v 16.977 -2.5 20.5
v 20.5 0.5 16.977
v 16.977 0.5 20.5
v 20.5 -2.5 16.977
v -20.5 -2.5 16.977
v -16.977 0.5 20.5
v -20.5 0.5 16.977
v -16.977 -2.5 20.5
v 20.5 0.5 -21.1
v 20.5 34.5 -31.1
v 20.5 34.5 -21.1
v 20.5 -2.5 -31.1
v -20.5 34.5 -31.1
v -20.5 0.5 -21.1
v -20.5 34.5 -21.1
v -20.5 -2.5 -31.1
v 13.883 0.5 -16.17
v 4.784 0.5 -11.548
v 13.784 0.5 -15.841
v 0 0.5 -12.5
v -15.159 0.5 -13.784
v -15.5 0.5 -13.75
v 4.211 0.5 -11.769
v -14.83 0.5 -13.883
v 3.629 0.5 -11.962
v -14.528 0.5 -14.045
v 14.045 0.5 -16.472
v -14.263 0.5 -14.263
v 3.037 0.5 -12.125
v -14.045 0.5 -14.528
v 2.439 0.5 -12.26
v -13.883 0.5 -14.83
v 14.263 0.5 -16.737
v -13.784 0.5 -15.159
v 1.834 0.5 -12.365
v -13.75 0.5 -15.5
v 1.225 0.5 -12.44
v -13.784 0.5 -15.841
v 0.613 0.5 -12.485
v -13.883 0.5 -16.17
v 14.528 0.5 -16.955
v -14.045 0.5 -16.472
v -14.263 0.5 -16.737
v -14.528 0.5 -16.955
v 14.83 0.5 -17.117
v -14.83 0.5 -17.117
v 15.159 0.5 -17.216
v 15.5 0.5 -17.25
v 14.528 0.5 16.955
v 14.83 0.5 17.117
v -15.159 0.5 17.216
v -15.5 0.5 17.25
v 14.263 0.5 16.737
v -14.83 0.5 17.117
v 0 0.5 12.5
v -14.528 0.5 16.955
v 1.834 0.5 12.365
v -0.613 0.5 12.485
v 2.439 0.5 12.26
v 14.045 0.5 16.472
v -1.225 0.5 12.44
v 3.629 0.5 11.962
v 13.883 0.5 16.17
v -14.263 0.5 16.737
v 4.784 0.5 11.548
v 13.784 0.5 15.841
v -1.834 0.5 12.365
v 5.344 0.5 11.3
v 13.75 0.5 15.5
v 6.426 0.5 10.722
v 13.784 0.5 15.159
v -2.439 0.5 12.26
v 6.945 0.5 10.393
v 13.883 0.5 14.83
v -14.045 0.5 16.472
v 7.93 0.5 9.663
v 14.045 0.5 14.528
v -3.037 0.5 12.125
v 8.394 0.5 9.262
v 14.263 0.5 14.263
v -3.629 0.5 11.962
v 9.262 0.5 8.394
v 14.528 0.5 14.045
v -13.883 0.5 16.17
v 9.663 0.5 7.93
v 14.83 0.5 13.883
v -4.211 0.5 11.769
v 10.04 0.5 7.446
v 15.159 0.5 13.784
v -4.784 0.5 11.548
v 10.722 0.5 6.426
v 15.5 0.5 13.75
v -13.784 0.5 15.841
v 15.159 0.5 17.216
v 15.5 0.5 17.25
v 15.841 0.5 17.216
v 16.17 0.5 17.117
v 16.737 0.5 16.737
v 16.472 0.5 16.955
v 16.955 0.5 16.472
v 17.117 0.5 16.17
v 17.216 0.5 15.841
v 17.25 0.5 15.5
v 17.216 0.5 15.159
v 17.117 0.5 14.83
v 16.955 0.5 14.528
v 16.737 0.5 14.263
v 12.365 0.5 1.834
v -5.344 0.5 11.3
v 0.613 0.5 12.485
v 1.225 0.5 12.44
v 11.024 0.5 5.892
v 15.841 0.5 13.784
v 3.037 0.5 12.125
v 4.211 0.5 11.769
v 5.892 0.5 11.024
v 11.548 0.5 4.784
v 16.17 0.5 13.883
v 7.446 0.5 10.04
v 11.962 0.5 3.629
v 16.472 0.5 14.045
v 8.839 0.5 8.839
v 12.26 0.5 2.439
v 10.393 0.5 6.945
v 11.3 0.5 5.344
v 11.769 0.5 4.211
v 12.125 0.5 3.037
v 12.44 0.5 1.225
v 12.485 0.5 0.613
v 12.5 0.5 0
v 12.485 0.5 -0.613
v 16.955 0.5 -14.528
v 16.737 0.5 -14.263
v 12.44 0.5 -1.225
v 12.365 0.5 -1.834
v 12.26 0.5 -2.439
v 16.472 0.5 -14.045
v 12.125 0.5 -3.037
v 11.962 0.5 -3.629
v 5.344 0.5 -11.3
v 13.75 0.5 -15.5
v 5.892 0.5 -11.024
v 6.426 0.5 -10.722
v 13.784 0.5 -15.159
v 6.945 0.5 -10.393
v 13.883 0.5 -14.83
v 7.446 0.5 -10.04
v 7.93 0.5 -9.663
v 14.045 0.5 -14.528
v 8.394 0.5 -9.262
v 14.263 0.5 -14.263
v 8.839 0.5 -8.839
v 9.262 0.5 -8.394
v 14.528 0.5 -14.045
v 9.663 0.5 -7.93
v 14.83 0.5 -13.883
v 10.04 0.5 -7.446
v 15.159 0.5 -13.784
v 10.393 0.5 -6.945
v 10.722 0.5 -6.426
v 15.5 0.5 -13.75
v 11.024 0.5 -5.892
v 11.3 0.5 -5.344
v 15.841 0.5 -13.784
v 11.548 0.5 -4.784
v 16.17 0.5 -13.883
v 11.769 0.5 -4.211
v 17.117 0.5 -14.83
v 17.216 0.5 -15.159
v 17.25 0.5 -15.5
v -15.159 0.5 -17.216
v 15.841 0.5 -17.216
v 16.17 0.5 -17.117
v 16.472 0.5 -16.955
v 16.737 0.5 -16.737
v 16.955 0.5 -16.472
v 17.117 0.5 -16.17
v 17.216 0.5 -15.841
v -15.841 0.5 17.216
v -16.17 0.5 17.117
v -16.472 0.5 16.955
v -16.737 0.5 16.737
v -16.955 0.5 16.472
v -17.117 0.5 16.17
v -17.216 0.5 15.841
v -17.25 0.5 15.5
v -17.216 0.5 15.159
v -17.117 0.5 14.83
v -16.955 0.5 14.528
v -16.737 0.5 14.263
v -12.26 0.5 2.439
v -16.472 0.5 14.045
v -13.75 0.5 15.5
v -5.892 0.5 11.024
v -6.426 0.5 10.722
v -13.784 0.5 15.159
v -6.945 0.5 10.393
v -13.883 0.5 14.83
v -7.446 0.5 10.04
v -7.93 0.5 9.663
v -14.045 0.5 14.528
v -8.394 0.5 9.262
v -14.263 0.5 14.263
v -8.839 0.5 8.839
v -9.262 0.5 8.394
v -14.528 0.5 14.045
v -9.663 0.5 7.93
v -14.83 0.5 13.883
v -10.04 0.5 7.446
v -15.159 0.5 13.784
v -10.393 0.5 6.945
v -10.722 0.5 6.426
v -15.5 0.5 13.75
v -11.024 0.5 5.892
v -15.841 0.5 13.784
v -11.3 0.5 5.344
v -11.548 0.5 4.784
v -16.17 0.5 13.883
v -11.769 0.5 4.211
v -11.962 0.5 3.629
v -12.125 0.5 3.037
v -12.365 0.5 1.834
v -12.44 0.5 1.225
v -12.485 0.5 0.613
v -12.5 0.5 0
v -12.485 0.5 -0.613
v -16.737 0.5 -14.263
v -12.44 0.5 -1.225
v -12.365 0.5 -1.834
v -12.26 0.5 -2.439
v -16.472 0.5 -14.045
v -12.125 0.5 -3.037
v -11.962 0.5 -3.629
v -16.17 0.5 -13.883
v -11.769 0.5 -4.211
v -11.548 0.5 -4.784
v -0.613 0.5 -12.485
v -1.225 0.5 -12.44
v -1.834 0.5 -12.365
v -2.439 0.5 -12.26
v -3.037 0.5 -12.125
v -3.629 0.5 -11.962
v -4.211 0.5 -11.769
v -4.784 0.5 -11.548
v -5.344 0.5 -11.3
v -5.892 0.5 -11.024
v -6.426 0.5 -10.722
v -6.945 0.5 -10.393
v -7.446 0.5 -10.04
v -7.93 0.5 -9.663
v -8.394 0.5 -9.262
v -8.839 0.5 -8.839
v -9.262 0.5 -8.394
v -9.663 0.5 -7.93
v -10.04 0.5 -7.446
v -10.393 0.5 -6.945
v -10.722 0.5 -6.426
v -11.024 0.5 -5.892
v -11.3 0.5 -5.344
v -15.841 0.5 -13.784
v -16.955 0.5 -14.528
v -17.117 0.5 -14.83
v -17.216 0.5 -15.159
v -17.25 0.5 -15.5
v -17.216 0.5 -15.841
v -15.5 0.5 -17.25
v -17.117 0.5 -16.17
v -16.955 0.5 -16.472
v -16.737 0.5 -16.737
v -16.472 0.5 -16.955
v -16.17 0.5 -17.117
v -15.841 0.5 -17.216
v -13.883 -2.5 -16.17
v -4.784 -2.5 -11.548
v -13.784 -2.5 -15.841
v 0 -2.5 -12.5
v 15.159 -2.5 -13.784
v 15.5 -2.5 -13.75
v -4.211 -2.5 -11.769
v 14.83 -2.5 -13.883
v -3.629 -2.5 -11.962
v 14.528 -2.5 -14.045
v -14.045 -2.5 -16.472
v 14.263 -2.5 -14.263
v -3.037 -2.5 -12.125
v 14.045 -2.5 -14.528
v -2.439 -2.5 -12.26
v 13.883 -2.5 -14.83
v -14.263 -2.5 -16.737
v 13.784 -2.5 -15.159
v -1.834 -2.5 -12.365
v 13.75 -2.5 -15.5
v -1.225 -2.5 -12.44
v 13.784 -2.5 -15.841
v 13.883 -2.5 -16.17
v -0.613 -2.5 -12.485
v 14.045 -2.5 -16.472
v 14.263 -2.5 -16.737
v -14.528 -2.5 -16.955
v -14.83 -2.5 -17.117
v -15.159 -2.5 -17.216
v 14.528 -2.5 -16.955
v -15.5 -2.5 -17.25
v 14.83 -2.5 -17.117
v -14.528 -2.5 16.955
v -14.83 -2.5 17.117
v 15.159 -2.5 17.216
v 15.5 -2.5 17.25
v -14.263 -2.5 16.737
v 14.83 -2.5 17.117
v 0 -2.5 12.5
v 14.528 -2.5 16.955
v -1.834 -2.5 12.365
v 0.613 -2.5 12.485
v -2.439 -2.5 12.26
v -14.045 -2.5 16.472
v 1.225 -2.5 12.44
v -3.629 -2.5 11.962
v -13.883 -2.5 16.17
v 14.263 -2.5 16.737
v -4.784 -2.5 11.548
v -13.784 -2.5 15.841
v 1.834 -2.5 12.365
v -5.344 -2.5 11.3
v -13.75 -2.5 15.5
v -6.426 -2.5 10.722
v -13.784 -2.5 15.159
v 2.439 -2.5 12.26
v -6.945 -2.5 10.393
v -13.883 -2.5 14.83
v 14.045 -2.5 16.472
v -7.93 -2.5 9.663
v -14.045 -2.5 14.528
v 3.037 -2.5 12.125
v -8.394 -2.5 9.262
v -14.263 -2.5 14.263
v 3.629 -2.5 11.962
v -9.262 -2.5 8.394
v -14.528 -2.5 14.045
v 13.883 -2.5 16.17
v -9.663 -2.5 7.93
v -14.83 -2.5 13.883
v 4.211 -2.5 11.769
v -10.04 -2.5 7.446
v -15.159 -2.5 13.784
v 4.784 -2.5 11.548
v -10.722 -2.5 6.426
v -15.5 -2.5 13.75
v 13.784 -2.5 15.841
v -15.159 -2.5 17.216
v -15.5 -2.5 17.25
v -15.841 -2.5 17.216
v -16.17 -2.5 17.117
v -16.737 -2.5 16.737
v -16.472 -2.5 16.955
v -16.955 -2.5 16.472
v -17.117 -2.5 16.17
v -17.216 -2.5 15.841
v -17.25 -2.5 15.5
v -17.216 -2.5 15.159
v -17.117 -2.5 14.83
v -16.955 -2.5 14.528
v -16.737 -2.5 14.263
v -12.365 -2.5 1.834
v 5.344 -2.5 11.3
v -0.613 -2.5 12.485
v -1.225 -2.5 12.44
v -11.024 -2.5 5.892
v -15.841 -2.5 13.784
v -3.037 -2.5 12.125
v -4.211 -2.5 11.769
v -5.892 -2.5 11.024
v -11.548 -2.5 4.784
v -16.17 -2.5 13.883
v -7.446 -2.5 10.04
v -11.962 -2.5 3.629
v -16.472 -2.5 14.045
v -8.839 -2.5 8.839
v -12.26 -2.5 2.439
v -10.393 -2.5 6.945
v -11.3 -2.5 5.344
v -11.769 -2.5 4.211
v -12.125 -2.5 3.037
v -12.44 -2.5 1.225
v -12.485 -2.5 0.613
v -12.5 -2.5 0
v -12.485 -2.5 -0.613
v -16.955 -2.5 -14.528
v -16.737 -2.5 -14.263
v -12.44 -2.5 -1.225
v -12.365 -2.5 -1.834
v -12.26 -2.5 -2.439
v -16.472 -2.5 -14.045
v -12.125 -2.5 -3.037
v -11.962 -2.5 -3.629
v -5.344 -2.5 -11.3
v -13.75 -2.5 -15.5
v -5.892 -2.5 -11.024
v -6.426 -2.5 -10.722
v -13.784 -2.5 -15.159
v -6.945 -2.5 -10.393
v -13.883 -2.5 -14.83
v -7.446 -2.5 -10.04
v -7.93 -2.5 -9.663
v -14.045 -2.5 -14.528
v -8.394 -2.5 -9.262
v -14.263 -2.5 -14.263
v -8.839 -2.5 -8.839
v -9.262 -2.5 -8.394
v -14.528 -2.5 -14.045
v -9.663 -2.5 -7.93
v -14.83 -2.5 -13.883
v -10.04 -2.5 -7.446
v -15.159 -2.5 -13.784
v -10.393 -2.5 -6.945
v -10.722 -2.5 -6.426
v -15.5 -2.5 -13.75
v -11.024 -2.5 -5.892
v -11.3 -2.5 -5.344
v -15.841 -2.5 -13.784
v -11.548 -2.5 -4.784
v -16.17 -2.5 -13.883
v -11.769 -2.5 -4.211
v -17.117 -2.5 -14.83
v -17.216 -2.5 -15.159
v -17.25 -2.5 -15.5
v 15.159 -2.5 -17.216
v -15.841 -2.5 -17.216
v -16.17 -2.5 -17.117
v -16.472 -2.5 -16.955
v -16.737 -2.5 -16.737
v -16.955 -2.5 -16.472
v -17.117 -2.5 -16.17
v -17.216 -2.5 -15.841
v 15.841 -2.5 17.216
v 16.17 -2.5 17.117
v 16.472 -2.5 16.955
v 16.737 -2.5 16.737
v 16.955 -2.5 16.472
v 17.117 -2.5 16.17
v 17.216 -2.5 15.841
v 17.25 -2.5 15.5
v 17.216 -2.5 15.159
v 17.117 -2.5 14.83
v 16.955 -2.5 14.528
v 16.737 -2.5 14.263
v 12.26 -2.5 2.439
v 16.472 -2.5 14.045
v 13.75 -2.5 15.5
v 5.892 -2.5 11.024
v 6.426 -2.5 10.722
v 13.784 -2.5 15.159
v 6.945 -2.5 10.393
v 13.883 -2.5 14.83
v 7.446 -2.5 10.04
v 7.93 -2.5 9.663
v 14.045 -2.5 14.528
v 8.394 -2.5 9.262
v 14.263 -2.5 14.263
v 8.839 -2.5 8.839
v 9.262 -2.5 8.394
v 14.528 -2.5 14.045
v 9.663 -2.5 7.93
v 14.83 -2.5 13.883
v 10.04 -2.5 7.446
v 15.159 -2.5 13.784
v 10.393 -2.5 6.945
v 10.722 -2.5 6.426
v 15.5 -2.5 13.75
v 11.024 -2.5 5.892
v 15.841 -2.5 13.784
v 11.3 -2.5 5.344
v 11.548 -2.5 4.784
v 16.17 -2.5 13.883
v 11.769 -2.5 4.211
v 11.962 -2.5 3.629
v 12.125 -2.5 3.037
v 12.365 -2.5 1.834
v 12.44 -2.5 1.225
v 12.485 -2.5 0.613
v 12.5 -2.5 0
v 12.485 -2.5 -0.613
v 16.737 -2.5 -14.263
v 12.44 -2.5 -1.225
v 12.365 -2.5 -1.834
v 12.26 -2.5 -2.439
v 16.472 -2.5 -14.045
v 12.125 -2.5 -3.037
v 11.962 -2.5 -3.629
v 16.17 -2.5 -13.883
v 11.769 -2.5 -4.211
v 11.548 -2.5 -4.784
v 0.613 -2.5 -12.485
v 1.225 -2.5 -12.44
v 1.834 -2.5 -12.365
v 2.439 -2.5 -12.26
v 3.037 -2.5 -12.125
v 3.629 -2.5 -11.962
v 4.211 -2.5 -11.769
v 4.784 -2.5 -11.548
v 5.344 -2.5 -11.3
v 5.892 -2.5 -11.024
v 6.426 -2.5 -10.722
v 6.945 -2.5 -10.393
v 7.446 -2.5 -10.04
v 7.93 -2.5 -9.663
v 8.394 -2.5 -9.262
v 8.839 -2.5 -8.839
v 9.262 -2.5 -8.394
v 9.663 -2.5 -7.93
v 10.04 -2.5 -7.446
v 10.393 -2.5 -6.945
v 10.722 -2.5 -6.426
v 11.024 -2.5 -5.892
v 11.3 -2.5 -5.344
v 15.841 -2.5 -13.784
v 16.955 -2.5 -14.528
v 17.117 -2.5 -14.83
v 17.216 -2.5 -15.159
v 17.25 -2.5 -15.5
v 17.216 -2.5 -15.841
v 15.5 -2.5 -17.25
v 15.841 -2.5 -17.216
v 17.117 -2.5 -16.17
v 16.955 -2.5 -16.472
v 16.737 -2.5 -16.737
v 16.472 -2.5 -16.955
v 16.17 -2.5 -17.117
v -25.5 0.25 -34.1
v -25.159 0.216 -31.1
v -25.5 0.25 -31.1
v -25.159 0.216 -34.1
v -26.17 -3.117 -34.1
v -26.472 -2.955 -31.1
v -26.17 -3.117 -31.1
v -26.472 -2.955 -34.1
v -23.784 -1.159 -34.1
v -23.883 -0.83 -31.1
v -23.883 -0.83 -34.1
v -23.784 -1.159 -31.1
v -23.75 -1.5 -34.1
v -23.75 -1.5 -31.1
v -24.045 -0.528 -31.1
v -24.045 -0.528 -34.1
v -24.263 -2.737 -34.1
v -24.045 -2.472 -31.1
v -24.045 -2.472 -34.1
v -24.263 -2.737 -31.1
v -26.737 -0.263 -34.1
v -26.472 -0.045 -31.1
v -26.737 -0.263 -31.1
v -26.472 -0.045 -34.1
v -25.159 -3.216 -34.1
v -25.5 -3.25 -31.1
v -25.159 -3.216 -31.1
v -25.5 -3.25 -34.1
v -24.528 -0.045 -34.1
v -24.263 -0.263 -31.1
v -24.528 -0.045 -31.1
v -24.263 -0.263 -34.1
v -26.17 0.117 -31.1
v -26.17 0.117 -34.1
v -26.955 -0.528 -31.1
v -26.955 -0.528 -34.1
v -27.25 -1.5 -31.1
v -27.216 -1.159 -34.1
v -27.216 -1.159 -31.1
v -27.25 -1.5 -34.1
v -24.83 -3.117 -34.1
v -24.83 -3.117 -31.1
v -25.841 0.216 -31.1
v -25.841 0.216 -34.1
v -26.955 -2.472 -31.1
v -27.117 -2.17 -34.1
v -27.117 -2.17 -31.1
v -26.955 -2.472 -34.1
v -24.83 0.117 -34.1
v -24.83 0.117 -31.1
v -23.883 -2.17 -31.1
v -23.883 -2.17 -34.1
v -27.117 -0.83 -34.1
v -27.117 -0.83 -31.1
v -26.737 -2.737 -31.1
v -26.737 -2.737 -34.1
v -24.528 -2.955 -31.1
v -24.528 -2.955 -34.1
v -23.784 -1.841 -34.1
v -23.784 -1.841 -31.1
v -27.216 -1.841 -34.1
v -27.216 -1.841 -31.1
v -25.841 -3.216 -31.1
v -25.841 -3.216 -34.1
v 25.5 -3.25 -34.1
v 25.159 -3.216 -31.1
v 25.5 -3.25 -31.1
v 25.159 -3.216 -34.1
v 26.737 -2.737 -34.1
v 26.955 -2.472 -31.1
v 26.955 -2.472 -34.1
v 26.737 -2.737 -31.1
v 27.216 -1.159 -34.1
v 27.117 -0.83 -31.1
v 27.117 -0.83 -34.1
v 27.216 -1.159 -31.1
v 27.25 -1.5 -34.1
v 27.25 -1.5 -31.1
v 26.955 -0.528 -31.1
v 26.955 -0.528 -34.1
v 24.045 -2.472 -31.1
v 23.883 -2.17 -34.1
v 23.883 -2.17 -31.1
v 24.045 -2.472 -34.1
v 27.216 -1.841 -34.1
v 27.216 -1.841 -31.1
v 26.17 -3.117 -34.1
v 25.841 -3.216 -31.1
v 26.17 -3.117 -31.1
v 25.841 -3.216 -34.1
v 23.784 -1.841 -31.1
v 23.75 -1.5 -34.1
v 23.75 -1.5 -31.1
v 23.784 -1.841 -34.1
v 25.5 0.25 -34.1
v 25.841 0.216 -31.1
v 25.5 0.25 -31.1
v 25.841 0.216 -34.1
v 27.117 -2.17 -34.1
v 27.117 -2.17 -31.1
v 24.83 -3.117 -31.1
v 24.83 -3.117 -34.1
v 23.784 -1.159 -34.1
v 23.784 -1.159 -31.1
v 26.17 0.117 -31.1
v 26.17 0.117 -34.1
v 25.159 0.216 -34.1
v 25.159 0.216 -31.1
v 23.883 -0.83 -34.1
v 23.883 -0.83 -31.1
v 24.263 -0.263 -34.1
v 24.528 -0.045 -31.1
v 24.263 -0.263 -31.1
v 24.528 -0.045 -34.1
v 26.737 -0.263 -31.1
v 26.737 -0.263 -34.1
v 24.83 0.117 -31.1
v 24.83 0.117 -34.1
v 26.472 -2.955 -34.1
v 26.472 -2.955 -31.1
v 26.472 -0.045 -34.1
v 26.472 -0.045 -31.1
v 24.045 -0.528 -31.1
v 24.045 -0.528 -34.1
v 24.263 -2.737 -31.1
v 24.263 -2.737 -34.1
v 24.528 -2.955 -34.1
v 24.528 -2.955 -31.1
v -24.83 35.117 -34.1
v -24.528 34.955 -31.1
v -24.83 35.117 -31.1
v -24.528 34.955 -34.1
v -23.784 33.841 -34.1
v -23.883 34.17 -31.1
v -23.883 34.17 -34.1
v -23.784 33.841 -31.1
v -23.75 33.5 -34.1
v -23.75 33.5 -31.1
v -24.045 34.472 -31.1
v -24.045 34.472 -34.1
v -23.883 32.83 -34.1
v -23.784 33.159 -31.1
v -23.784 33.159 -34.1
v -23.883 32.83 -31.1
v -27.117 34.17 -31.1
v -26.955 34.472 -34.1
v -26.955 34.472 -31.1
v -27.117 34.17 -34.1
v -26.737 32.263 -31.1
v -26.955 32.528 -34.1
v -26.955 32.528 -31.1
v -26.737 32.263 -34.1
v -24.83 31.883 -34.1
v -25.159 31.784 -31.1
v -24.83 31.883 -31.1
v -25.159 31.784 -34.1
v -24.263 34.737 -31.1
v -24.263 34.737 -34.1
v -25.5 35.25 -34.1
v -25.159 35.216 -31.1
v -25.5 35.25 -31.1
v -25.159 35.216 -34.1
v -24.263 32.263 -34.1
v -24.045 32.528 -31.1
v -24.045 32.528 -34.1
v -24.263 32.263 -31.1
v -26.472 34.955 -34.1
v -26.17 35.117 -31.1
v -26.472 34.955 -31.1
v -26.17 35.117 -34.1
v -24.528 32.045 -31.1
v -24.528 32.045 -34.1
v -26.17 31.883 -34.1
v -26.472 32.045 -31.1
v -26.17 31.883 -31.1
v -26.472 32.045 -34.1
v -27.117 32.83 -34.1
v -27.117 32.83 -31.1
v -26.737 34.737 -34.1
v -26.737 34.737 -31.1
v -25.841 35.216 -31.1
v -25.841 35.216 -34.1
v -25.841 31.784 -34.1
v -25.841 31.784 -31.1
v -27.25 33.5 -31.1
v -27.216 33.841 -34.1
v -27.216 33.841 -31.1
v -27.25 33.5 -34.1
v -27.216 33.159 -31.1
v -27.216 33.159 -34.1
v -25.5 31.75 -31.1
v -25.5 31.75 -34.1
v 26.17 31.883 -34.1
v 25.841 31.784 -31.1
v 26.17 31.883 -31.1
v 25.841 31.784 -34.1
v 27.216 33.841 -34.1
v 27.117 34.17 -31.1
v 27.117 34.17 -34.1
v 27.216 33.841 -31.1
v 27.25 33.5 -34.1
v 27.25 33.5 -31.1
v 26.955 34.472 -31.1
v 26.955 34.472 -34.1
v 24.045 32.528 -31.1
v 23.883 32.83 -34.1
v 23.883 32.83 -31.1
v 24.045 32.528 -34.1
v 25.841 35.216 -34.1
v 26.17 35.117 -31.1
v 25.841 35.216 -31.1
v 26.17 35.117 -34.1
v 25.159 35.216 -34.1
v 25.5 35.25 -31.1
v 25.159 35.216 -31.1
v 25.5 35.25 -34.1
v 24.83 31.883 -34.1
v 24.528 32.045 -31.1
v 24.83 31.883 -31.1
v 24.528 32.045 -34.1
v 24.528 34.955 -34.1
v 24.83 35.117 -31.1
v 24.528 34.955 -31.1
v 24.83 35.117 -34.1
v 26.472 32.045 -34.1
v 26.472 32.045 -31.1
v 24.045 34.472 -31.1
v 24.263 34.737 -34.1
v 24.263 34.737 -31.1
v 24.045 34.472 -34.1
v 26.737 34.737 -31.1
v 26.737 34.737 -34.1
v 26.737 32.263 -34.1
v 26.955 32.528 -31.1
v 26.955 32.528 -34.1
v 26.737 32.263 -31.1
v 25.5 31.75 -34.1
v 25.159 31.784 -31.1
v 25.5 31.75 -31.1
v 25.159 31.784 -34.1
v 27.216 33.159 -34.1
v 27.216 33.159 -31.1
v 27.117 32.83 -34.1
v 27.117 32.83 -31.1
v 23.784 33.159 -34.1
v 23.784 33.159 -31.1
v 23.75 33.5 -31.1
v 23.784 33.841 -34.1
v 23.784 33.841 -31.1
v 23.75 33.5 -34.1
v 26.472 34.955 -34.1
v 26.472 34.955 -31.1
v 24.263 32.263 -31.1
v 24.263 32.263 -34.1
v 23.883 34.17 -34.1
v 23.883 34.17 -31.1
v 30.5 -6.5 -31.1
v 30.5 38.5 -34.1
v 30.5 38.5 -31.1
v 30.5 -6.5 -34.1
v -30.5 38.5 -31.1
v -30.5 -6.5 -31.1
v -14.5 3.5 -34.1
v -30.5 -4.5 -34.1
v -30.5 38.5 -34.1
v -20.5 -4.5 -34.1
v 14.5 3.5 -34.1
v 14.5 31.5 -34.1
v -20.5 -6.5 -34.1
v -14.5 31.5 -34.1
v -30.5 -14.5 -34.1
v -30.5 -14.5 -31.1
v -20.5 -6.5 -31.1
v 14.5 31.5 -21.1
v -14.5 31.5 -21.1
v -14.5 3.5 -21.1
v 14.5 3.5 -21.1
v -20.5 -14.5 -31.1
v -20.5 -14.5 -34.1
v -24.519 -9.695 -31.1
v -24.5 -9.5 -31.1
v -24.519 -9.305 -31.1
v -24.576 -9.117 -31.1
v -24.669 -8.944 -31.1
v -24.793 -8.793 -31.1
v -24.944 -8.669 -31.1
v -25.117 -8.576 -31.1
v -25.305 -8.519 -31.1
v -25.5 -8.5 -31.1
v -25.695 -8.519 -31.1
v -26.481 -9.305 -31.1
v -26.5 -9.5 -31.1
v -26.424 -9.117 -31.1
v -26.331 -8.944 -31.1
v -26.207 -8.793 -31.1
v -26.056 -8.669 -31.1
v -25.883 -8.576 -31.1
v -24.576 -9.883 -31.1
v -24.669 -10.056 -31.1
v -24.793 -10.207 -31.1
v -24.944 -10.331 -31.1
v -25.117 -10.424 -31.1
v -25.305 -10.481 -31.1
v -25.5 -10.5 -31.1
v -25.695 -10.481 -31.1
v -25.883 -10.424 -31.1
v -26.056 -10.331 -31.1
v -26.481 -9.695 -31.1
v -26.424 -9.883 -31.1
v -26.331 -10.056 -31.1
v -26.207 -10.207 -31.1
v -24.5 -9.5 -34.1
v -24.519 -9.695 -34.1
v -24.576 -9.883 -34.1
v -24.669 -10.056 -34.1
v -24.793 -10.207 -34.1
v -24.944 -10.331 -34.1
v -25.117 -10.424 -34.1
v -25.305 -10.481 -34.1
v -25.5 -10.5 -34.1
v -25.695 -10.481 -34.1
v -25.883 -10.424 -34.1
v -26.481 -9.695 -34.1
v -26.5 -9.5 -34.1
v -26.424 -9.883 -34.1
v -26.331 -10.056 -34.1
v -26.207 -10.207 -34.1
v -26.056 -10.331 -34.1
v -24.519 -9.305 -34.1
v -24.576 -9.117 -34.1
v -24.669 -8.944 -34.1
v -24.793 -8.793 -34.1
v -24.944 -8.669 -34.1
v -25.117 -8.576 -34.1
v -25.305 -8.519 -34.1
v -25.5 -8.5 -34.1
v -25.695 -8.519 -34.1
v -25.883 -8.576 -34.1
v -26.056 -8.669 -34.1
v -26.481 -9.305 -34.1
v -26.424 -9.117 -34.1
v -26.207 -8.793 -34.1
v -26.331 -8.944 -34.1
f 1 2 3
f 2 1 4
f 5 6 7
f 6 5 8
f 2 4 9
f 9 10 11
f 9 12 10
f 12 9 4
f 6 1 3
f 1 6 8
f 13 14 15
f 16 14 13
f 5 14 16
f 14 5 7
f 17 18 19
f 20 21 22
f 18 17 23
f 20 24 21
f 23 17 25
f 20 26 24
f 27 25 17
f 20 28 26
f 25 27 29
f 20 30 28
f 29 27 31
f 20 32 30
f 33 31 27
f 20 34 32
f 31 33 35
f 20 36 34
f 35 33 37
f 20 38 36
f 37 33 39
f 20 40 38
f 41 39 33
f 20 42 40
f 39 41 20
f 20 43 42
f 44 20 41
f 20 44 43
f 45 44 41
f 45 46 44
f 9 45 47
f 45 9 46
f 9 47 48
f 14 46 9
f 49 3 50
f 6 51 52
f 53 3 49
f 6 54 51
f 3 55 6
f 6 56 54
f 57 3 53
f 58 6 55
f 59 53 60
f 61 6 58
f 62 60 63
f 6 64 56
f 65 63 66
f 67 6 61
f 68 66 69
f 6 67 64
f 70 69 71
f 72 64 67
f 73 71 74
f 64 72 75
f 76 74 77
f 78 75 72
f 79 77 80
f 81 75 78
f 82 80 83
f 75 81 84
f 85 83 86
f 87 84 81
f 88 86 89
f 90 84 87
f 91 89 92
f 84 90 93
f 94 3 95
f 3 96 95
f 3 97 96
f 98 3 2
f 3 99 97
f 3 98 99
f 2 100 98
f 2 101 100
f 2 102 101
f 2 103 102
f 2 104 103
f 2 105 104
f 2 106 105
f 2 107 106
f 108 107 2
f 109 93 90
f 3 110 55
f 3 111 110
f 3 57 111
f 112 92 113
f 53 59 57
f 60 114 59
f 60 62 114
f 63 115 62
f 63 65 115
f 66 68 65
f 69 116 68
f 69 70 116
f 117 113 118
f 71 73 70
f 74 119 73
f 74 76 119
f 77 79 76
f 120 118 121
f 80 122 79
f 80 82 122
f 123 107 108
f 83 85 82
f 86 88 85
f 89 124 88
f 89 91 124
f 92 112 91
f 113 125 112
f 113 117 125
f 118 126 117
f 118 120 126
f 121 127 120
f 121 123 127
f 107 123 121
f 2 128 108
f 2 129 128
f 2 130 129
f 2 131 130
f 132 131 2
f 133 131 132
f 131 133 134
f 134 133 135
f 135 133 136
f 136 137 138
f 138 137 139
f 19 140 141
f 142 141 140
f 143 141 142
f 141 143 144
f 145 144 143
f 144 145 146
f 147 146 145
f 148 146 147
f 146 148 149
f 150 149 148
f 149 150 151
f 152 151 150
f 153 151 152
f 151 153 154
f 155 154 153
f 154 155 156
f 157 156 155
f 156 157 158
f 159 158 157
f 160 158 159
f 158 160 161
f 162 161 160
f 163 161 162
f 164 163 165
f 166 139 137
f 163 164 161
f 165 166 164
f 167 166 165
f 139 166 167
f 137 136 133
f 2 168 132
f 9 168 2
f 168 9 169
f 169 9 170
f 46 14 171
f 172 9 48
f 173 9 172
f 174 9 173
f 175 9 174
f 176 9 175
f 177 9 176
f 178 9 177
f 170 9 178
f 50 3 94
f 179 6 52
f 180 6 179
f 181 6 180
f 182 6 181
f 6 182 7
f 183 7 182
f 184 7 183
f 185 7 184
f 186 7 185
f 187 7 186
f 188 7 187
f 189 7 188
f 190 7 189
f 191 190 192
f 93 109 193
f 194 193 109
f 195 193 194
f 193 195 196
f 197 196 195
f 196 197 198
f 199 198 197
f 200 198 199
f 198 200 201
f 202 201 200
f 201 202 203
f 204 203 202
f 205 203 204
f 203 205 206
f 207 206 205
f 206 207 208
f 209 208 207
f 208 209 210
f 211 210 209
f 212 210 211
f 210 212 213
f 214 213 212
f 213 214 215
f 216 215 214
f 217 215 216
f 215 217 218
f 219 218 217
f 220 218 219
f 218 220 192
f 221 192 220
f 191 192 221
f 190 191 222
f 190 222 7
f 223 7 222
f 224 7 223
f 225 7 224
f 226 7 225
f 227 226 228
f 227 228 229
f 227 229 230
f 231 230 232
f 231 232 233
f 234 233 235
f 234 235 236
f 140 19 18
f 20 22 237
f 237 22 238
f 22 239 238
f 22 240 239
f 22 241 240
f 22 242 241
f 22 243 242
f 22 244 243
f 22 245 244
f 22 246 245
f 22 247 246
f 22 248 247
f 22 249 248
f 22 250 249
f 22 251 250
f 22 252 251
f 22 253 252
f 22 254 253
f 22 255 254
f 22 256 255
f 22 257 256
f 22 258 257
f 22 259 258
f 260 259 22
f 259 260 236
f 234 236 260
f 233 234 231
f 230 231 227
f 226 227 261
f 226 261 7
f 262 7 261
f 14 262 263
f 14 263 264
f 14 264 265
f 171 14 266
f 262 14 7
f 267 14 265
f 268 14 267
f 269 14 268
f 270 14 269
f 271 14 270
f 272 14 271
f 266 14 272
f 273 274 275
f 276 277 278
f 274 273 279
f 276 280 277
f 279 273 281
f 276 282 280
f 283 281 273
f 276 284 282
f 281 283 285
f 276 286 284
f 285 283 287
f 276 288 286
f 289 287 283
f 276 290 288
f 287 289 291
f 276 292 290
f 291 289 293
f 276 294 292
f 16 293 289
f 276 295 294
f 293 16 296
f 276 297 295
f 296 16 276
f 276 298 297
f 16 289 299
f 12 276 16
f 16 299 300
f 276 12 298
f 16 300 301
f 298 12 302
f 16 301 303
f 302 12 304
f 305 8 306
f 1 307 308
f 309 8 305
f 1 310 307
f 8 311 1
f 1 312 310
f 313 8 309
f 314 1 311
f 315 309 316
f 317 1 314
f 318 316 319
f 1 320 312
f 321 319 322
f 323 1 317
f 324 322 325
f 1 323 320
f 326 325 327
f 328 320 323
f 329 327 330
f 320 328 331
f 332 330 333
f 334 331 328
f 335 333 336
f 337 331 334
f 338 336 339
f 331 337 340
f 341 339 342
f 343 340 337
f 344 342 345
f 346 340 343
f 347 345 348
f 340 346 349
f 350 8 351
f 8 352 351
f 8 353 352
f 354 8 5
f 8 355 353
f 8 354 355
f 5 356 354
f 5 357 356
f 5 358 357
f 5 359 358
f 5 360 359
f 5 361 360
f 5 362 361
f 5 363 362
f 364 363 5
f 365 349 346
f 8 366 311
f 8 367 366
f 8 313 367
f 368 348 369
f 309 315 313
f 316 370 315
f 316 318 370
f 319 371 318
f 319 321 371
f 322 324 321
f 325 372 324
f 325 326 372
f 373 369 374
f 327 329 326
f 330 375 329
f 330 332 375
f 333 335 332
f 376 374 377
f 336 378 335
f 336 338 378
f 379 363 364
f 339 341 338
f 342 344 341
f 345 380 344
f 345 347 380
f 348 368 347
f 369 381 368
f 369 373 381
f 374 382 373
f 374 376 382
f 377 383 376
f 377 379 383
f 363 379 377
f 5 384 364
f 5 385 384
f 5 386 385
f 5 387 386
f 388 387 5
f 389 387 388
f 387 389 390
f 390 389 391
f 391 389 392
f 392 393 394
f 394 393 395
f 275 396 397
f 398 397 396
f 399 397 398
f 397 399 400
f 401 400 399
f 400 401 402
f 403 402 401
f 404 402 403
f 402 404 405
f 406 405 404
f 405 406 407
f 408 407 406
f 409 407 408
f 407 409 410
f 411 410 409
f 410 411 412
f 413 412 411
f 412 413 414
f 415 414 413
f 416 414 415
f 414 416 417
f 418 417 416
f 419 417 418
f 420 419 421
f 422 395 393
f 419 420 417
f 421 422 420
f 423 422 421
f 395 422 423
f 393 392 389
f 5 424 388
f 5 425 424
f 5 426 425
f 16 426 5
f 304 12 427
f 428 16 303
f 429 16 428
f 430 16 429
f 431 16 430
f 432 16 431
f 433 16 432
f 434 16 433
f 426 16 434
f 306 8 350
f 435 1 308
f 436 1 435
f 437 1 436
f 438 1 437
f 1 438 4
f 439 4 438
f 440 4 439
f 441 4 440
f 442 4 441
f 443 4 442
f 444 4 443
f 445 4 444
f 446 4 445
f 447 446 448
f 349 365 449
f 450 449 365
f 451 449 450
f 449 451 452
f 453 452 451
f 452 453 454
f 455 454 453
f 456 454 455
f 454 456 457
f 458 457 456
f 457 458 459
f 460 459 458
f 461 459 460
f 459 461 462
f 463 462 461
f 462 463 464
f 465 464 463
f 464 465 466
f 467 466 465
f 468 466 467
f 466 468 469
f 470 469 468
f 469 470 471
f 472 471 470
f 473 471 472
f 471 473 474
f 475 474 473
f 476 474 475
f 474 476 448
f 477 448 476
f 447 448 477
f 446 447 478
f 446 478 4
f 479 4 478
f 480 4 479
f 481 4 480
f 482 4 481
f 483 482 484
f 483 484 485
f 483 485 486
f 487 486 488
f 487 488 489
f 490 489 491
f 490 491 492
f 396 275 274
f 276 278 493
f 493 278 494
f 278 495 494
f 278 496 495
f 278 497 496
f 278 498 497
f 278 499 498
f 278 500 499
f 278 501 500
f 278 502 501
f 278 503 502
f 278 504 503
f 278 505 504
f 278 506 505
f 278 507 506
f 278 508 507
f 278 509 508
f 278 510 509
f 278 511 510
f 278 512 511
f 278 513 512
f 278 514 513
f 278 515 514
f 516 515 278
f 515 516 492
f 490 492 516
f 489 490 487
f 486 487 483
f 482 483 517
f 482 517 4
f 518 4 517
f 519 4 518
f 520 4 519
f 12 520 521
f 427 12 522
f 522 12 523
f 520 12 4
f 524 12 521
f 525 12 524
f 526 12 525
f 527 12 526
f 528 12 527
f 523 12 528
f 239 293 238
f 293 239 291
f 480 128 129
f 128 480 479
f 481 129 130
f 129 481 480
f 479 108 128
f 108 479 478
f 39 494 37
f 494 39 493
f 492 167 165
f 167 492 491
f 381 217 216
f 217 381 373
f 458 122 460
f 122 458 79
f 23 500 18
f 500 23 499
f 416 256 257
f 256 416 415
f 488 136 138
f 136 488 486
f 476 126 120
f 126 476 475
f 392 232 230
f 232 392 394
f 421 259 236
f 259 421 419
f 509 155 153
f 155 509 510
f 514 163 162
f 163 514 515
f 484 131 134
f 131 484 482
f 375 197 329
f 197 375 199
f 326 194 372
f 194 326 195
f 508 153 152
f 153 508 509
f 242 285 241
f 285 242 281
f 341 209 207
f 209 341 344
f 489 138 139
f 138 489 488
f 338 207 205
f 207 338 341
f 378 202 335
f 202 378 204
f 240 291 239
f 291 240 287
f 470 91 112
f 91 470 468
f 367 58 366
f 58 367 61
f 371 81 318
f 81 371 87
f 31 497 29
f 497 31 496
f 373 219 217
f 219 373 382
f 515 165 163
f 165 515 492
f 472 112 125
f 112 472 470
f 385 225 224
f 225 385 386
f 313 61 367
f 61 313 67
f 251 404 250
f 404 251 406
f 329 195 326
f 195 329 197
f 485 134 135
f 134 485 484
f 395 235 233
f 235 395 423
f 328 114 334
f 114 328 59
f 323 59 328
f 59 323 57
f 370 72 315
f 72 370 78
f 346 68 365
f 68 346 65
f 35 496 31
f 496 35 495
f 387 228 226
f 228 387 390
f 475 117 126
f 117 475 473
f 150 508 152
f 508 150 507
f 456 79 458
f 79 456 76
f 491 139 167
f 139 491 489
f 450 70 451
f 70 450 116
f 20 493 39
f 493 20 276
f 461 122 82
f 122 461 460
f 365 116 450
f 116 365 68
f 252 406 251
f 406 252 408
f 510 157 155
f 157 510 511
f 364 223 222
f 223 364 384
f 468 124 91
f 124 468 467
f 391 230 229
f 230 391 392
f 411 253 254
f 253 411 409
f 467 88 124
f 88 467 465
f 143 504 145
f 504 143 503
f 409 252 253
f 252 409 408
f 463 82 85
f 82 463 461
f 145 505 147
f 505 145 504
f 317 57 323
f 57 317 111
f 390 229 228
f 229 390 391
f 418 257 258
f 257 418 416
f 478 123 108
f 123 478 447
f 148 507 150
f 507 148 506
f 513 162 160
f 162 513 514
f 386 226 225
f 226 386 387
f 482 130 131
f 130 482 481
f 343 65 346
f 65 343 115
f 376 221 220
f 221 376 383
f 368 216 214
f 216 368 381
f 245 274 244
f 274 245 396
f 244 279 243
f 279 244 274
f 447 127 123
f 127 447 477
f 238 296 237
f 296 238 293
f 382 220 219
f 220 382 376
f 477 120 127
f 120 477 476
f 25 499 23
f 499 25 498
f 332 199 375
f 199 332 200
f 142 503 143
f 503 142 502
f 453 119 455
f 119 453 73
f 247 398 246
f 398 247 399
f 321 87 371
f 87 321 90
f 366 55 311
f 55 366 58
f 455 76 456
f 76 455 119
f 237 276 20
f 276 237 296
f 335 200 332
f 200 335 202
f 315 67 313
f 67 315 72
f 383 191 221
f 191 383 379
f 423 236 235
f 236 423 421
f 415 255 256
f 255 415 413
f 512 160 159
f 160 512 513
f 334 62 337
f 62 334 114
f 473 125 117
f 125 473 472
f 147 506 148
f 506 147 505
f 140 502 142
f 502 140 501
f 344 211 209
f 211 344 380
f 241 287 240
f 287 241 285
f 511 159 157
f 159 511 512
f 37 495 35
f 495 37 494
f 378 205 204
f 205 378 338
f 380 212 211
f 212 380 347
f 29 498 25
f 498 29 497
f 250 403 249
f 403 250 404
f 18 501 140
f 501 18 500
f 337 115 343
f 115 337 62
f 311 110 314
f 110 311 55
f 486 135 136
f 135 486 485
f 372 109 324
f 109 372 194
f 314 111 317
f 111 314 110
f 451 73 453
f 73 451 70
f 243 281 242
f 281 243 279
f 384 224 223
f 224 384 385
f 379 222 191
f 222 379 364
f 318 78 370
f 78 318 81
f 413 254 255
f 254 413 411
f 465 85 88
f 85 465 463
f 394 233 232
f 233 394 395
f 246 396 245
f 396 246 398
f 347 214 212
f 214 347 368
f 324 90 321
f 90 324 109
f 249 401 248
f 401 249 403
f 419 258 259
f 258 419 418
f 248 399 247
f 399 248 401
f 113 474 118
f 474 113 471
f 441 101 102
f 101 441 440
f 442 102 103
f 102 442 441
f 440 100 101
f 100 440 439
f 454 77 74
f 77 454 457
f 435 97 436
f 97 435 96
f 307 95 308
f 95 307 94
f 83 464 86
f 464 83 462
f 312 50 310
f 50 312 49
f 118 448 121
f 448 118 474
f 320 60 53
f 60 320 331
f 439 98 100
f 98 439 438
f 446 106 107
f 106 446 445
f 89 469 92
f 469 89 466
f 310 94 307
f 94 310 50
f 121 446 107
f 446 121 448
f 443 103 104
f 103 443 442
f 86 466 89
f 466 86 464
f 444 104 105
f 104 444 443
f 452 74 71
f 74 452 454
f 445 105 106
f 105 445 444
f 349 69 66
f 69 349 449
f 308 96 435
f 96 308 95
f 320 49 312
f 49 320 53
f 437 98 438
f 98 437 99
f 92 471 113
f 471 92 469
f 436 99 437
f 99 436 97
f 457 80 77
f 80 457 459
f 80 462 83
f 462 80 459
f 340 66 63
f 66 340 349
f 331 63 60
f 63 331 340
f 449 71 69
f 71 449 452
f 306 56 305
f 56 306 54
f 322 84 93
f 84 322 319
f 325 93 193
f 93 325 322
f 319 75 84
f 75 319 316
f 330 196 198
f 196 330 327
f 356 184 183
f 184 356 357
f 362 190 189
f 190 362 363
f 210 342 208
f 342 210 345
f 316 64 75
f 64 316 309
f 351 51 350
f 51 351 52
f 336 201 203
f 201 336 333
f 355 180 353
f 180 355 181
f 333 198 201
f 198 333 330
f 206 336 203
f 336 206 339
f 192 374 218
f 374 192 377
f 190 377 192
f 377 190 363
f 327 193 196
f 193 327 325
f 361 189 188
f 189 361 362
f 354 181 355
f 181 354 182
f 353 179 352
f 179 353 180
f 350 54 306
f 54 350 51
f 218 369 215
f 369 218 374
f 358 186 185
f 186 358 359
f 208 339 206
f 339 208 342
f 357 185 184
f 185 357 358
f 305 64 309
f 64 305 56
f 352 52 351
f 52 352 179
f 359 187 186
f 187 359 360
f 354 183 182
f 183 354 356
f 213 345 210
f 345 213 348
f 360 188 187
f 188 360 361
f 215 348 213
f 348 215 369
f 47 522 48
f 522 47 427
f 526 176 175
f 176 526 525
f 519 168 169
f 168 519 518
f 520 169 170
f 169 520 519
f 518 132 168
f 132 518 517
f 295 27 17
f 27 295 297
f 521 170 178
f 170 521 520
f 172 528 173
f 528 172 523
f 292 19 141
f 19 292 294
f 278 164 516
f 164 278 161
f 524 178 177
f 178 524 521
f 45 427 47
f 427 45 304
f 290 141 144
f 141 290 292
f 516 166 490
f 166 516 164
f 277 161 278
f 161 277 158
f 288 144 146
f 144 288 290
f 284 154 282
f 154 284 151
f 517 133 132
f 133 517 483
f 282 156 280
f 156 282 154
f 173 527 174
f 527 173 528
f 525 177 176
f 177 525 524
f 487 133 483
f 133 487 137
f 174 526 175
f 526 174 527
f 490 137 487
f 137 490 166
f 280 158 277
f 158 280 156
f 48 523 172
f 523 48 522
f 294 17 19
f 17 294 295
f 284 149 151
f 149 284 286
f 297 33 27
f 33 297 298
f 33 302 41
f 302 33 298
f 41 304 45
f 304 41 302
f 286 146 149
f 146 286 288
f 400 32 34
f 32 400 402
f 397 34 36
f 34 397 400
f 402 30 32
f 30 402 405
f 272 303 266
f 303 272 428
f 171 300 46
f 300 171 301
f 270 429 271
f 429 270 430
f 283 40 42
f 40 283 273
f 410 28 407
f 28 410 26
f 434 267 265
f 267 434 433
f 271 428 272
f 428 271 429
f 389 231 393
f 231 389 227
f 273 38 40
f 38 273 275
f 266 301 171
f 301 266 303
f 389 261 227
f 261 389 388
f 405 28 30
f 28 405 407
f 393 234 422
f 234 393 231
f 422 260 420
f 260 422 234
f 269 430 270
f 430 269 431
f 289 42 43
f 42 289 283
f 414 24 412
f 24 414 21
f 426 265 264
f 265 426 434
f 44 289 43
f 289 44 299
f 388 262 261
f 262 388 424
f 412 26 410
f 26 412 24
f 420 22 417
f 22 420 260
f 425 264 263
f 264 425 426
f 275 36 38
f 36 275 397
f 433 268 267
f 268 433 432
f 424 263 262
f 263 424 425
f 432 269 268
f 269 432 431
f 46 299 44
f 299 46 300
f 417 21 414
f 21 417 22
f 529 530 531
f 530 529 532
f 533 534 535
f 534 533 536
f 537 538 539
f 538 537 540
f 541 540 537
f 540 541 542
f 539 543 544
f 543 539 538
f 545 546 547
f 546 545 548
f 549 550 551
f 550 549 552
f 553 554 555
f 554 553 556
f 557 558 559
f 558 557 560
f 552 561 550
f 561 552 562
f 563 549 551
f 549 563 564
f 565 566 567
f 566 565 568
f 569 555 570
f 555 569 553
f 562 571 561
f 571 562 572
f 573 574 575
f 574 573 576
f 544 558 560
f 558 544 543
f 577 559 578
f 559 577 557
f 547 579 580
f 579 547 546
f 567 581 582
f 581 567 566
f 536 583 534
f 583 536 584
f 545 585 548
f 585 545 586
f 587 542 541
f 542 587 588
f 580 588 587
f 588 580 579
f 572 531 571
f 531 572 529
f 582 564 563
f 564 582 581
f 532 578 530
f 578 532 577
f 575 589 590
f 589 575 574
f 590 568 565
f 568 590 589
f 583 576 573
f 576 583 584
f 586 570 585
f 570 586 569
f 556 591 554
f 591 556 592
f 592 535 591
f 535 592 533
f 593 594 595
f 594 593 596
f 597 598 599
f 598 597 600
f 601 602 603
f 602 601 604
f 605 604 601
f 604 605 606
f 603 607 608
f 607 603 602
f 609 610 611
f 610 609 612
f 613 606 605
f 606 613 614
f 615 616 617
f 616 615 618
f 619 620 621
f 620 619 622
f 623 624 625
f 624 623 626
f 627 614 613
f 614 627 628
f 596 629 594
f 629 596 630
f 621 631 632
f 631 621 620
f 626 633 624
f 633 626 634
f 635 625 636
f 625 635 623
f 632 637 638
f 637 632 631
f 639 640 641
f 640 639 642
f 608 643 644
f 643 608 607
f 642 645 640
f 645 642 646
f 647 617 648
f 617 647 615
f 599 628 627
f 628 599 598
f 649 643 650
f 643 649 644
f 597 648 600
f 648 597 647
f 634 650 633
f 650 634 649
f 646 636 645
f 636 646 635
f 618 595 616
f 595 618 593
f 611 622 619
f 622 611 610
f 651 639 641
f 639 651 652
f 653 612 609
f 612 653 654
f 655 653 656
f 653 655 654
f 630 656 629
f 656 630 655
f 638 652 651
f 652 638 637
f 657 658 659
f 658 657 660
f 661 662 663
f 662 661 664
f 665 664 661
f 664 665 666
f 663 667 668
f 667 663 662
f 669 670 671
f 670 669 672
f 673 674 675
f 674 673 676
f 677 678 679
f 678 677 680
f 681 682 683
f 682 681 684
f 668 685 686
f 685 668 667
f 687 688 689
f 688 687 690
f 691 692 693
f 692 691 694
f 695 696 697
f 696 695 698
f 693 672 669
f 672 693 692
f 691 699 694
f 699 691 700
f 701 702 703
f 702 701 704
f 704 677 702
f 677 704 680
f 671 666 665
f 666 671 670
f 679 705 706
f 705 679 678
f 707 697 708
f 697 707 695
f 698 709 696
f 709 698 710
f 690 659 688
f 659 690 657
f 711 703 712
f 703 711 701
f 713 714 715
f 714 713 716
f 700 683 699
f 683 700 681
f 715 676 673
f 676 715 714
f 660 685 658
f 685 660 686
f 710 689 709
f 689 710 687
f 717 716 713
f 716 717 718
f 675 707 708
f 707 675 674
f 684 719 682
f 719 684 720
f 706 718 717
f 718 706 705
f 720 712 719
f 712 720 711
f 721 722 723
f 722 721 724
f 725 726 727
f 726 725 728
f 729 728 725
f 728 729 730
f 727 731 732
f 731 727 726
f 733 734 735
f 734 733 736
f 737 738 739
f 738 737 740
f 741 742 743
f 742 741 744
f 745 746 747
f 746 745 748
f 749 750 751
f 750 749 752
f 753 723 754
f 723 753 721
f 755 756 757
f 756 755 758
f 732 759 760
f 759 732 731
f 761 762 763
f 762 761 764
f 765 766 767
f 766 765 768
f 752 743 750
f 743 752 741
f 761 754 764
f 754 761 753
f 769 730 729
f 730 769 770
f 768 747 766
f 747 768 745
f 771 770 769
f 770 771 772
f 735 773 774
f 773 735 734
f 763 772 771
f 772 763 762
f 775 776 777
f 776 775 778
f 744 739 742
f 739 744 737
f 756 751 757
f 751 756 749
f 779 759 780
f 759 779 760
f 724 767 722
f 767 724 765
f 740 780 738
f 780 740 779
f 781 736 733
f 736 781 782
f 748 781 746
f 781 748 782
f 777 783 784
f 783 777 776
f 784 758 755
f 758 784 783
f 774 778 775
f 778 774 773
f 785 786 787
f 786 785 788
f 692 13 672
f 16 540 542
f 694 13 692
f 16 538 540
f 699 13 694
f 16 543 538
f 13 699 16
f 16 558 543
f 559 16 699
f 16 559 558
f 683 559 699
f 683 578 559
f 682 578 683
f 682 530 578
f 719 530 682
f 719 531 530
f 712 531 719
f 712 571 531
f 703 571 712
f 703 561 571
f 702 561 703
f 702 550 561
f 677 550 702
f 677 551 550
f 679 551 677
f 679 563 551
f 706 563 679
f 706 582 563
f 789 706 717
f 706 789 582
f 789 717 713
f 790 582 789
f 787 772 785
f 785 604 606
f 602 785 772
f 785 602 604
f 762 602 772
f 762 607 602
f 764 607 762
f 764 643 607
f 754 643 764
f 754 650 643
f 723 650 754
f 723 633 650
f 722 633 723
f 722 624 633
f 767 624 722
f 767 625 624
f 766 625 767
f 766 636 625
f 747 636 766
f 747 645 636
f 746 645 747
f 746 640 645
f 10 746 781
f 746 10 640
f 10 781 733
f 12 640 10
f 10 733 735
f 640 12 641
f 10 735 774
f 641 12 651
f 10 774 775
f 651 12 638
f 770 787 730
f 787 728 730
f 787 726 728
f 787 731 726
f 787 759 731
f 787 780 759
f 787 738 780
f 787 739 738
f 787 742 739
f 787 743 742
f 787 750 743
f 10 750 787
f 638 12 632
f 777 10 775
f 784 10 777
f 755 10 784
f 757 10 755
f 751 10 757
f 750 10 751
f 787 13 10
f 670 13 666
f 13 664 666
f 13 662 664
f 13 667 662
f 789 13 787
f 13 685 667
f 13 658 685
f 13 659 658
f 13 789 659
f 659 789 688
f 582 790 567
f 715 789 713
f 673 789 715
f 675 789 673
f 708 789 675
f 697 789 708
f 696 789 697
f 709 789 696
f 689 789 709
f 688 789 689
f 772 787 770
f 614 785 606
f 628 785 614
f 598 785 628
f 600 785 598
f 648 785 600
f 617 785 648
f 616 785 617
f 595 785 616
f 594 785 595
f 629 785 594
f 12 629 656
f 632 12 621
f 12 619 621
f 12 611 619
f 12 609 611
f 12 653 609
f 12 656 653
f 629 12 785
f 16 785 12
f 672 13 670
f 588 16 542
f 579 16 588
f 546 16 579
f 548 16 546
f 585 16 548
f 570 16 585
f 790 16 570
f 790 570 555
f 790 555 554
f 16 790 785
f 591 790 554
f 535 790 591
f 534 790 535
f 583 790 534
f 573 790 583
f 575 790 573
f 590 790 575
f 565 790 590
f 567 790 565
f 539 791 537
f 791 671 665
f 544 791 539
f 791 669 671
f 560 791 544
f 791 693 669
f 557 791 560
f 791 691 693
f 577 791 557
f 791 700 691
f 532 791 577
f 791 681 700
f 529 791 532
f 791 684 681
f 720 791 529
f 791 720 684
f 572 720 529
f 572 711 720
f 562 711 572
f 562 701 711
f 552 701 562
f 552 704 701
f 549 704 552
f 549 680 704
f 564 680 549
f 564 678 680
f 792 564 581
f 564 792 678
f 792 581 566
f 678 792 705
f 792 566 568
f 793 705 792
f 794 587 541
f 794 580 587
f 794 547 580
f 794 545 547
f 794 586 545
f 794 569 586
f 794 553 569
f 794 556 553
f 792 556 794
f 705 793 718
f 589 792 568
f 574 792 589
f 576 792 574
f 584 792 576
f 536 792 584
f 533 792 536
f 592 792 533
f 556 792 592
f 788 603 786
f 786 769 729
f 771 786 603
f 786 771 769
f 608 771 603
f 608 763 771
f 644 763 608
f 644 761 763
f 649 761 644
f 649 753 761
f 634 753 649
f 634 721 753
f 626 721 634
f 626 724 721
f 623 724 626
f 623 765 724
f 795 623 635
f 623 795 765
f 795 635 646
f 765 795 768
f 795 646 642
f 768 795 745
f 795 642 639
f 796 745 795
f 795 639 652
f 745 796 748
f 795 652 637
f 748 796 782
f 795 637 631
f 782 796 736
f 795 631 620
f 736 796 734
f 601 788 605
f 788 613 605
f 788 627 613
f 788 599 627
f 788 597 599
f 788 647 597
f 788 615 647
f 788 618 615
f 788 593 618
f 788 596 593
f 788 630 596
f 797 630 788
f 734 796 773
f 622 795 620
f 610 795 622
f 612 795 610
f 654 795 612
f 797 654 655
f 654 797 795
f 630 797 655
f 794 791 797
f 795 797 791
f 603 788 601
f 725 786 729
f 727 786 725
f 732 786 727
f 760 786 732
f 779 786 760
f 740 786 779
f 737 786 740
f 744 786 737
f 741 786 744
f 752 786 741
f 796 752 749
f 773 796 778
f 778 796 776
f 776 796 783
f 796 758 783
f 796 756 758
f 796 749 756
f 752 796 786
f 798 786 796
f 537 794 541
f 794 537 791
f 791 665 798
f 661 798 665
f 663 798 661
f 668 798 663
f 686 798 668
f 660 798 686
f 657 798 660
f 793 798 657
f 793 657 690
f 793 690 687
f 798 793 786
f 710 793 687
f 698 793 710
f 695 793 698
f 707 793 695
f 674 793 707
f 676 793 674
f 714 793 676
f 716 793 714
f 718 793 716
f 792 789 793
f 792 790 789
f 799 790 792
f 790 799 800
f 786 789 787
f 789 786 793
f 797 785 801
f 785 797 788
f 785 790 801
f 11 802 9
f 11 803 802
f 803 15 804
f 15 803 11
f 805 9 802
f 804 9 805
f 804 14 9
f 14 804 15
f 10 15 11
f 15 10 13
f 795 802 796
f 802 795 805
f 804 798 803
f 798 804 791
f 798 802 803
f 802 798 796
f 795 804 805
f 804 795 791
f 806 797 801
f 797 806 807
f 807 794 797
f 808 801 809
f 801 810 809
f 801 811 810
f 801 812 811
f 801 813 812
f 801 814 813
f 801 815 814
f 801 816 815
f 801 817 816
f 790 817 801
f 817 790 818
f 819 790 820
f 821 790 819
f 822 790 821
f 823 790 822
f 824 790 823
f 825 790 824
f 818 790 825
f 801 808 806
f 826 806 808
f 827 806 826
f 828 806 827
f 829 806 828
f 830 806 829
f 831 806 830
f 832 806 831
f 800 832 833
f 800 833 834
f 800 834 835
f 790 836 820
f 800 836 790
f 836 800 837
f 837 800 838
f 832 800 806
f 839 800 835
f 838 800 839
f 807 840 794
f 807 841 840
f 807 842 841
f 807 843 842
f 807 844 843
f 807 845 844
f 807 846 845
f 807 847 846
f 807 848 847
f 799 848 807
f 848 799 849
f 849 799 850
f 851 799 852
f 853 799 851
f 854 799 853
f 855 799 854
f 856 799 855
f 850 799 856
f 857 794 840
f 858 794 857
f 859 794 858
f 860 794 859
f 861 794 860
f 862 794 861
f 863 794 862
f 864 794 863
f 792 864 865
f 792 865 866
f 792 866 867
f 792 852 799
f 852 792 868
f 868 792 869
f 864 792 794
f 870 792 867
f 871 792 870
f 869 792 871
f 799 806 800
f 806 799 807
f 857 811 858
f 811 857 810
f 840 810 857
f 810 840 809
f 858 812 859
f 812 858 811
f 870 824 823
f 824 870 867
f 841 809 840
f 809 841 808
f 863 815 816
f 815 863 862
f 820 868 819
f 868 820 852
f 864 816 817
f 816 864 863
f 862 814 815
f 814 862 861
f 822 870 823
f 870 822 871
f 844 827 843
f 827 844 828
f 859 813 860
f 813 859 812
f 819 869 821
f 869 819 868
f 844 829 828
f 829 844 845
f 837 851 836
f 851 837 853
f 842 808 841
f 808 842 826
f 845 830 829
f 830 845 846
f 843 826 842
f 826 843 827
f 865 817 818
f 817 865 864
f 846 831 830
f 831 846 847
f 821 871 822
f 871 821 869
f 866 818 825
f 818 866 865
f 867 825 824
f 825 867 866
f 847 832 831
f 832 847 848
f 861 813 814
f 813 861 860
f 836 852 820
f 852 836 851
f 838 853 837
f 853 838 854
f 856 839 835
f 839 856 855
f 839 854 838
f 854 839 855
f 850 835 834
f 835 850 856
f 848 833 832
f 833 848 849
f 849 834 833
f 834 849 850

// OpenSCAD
$fn=32;

bp = 31/2;
br = 3.5/2;

// motor
* translate([0, 5/2, 0]) {
  translate([0, 34/2-2, 0]) intersection() {
    cube([41, 34, 41], center=true);
    rotate([0, 45, 0]) cube([53, 35, 53], center=true);
  }
  translate([0, -12, 0]) rotate([90, 0, 0]) {
    cylinder(r=52/2, h=6, center=true);
    translate([0, 0, (6+5)/2]) cylinder(r=19/2, h=5, center=true);
  }
  translate([0, -12, 0]) rotate([90, 0, 0]) cylinder(r=5/2, h=24, center=true);
}

// mount
difference() {
  intersection() {
    translate([0, -1, -.5]) cube([41, 3, 42], center=true);
    union() {
      rotate([0, 45, 0])cube([53, 10, 53], center=true);
      translate([0, 0, -20]) cube([45, 10, 45], center=true);
    }
  }
  rotate([90, 0, 0]) {
    cylinder(r=25/2, h=10, center=true, $fn=128);
    translate([bp, bp, 0]) cylinder(r=br, h=10, center=true);
    translate([-bp, bp, 0]) cylinder(r=br, h=10, center=true);
    translate([bp, -bp, 0]) cylinder(r=br, h=10, center=true);
    translate([-bp, -bp, 0]) cylinder(r=br, h=10, center=true);
  }
}

difference() {
  translate([0, 0, -.6]) union() {
    translate([0, 34/2-1, -(41+10)/2]) cube([41, 34+3, 10], center=true);
    difference() {
      translate([-61/2, -2.5-4, -41/2-10-3]) cube([61, 34+3+4*2, 3]);
      translate([0, 0, -41/2-10-2.5]) {
        translate([-61/2+5, -2.5+5-4]) cylinder(r=3.5/2, h=10, center=true);
        translate([61/2-5, -2.5+5-4]) cylinder(r=3.5/2, h=10, center=true);
        translate([-61/2+5, -2.5+34+3-5+4]) cylinder(r=3.5/2, h=10, center=true);
        translate([61/2-5, -2.5+34+3-5+4]) cylinder(r=3.5/2, h=10, center=true);
      }
    }
  }
  translate([-29/2, .5 + 3, -45]) cube([29, 34-6, 30]);
  // translate([0, 34, -41+10-3]) rotate([90, 0, 0]) cylinder(r=5/2, h=10, center=true);
}

translate([-50/2-1/2, -5-2.5, -41/2-10-1.5-.6]) difference() {
  translate([0, -2, 0]) cube([10, 10, 3], center=true);
  translate([0, -2, 10]) cylinder(r=1, h=30, center=true);
}


// bar
% translate([0, 34/2-1, -12/2-41/2-10-3-.6]) cube([100, 18+1, 12], center=true);
